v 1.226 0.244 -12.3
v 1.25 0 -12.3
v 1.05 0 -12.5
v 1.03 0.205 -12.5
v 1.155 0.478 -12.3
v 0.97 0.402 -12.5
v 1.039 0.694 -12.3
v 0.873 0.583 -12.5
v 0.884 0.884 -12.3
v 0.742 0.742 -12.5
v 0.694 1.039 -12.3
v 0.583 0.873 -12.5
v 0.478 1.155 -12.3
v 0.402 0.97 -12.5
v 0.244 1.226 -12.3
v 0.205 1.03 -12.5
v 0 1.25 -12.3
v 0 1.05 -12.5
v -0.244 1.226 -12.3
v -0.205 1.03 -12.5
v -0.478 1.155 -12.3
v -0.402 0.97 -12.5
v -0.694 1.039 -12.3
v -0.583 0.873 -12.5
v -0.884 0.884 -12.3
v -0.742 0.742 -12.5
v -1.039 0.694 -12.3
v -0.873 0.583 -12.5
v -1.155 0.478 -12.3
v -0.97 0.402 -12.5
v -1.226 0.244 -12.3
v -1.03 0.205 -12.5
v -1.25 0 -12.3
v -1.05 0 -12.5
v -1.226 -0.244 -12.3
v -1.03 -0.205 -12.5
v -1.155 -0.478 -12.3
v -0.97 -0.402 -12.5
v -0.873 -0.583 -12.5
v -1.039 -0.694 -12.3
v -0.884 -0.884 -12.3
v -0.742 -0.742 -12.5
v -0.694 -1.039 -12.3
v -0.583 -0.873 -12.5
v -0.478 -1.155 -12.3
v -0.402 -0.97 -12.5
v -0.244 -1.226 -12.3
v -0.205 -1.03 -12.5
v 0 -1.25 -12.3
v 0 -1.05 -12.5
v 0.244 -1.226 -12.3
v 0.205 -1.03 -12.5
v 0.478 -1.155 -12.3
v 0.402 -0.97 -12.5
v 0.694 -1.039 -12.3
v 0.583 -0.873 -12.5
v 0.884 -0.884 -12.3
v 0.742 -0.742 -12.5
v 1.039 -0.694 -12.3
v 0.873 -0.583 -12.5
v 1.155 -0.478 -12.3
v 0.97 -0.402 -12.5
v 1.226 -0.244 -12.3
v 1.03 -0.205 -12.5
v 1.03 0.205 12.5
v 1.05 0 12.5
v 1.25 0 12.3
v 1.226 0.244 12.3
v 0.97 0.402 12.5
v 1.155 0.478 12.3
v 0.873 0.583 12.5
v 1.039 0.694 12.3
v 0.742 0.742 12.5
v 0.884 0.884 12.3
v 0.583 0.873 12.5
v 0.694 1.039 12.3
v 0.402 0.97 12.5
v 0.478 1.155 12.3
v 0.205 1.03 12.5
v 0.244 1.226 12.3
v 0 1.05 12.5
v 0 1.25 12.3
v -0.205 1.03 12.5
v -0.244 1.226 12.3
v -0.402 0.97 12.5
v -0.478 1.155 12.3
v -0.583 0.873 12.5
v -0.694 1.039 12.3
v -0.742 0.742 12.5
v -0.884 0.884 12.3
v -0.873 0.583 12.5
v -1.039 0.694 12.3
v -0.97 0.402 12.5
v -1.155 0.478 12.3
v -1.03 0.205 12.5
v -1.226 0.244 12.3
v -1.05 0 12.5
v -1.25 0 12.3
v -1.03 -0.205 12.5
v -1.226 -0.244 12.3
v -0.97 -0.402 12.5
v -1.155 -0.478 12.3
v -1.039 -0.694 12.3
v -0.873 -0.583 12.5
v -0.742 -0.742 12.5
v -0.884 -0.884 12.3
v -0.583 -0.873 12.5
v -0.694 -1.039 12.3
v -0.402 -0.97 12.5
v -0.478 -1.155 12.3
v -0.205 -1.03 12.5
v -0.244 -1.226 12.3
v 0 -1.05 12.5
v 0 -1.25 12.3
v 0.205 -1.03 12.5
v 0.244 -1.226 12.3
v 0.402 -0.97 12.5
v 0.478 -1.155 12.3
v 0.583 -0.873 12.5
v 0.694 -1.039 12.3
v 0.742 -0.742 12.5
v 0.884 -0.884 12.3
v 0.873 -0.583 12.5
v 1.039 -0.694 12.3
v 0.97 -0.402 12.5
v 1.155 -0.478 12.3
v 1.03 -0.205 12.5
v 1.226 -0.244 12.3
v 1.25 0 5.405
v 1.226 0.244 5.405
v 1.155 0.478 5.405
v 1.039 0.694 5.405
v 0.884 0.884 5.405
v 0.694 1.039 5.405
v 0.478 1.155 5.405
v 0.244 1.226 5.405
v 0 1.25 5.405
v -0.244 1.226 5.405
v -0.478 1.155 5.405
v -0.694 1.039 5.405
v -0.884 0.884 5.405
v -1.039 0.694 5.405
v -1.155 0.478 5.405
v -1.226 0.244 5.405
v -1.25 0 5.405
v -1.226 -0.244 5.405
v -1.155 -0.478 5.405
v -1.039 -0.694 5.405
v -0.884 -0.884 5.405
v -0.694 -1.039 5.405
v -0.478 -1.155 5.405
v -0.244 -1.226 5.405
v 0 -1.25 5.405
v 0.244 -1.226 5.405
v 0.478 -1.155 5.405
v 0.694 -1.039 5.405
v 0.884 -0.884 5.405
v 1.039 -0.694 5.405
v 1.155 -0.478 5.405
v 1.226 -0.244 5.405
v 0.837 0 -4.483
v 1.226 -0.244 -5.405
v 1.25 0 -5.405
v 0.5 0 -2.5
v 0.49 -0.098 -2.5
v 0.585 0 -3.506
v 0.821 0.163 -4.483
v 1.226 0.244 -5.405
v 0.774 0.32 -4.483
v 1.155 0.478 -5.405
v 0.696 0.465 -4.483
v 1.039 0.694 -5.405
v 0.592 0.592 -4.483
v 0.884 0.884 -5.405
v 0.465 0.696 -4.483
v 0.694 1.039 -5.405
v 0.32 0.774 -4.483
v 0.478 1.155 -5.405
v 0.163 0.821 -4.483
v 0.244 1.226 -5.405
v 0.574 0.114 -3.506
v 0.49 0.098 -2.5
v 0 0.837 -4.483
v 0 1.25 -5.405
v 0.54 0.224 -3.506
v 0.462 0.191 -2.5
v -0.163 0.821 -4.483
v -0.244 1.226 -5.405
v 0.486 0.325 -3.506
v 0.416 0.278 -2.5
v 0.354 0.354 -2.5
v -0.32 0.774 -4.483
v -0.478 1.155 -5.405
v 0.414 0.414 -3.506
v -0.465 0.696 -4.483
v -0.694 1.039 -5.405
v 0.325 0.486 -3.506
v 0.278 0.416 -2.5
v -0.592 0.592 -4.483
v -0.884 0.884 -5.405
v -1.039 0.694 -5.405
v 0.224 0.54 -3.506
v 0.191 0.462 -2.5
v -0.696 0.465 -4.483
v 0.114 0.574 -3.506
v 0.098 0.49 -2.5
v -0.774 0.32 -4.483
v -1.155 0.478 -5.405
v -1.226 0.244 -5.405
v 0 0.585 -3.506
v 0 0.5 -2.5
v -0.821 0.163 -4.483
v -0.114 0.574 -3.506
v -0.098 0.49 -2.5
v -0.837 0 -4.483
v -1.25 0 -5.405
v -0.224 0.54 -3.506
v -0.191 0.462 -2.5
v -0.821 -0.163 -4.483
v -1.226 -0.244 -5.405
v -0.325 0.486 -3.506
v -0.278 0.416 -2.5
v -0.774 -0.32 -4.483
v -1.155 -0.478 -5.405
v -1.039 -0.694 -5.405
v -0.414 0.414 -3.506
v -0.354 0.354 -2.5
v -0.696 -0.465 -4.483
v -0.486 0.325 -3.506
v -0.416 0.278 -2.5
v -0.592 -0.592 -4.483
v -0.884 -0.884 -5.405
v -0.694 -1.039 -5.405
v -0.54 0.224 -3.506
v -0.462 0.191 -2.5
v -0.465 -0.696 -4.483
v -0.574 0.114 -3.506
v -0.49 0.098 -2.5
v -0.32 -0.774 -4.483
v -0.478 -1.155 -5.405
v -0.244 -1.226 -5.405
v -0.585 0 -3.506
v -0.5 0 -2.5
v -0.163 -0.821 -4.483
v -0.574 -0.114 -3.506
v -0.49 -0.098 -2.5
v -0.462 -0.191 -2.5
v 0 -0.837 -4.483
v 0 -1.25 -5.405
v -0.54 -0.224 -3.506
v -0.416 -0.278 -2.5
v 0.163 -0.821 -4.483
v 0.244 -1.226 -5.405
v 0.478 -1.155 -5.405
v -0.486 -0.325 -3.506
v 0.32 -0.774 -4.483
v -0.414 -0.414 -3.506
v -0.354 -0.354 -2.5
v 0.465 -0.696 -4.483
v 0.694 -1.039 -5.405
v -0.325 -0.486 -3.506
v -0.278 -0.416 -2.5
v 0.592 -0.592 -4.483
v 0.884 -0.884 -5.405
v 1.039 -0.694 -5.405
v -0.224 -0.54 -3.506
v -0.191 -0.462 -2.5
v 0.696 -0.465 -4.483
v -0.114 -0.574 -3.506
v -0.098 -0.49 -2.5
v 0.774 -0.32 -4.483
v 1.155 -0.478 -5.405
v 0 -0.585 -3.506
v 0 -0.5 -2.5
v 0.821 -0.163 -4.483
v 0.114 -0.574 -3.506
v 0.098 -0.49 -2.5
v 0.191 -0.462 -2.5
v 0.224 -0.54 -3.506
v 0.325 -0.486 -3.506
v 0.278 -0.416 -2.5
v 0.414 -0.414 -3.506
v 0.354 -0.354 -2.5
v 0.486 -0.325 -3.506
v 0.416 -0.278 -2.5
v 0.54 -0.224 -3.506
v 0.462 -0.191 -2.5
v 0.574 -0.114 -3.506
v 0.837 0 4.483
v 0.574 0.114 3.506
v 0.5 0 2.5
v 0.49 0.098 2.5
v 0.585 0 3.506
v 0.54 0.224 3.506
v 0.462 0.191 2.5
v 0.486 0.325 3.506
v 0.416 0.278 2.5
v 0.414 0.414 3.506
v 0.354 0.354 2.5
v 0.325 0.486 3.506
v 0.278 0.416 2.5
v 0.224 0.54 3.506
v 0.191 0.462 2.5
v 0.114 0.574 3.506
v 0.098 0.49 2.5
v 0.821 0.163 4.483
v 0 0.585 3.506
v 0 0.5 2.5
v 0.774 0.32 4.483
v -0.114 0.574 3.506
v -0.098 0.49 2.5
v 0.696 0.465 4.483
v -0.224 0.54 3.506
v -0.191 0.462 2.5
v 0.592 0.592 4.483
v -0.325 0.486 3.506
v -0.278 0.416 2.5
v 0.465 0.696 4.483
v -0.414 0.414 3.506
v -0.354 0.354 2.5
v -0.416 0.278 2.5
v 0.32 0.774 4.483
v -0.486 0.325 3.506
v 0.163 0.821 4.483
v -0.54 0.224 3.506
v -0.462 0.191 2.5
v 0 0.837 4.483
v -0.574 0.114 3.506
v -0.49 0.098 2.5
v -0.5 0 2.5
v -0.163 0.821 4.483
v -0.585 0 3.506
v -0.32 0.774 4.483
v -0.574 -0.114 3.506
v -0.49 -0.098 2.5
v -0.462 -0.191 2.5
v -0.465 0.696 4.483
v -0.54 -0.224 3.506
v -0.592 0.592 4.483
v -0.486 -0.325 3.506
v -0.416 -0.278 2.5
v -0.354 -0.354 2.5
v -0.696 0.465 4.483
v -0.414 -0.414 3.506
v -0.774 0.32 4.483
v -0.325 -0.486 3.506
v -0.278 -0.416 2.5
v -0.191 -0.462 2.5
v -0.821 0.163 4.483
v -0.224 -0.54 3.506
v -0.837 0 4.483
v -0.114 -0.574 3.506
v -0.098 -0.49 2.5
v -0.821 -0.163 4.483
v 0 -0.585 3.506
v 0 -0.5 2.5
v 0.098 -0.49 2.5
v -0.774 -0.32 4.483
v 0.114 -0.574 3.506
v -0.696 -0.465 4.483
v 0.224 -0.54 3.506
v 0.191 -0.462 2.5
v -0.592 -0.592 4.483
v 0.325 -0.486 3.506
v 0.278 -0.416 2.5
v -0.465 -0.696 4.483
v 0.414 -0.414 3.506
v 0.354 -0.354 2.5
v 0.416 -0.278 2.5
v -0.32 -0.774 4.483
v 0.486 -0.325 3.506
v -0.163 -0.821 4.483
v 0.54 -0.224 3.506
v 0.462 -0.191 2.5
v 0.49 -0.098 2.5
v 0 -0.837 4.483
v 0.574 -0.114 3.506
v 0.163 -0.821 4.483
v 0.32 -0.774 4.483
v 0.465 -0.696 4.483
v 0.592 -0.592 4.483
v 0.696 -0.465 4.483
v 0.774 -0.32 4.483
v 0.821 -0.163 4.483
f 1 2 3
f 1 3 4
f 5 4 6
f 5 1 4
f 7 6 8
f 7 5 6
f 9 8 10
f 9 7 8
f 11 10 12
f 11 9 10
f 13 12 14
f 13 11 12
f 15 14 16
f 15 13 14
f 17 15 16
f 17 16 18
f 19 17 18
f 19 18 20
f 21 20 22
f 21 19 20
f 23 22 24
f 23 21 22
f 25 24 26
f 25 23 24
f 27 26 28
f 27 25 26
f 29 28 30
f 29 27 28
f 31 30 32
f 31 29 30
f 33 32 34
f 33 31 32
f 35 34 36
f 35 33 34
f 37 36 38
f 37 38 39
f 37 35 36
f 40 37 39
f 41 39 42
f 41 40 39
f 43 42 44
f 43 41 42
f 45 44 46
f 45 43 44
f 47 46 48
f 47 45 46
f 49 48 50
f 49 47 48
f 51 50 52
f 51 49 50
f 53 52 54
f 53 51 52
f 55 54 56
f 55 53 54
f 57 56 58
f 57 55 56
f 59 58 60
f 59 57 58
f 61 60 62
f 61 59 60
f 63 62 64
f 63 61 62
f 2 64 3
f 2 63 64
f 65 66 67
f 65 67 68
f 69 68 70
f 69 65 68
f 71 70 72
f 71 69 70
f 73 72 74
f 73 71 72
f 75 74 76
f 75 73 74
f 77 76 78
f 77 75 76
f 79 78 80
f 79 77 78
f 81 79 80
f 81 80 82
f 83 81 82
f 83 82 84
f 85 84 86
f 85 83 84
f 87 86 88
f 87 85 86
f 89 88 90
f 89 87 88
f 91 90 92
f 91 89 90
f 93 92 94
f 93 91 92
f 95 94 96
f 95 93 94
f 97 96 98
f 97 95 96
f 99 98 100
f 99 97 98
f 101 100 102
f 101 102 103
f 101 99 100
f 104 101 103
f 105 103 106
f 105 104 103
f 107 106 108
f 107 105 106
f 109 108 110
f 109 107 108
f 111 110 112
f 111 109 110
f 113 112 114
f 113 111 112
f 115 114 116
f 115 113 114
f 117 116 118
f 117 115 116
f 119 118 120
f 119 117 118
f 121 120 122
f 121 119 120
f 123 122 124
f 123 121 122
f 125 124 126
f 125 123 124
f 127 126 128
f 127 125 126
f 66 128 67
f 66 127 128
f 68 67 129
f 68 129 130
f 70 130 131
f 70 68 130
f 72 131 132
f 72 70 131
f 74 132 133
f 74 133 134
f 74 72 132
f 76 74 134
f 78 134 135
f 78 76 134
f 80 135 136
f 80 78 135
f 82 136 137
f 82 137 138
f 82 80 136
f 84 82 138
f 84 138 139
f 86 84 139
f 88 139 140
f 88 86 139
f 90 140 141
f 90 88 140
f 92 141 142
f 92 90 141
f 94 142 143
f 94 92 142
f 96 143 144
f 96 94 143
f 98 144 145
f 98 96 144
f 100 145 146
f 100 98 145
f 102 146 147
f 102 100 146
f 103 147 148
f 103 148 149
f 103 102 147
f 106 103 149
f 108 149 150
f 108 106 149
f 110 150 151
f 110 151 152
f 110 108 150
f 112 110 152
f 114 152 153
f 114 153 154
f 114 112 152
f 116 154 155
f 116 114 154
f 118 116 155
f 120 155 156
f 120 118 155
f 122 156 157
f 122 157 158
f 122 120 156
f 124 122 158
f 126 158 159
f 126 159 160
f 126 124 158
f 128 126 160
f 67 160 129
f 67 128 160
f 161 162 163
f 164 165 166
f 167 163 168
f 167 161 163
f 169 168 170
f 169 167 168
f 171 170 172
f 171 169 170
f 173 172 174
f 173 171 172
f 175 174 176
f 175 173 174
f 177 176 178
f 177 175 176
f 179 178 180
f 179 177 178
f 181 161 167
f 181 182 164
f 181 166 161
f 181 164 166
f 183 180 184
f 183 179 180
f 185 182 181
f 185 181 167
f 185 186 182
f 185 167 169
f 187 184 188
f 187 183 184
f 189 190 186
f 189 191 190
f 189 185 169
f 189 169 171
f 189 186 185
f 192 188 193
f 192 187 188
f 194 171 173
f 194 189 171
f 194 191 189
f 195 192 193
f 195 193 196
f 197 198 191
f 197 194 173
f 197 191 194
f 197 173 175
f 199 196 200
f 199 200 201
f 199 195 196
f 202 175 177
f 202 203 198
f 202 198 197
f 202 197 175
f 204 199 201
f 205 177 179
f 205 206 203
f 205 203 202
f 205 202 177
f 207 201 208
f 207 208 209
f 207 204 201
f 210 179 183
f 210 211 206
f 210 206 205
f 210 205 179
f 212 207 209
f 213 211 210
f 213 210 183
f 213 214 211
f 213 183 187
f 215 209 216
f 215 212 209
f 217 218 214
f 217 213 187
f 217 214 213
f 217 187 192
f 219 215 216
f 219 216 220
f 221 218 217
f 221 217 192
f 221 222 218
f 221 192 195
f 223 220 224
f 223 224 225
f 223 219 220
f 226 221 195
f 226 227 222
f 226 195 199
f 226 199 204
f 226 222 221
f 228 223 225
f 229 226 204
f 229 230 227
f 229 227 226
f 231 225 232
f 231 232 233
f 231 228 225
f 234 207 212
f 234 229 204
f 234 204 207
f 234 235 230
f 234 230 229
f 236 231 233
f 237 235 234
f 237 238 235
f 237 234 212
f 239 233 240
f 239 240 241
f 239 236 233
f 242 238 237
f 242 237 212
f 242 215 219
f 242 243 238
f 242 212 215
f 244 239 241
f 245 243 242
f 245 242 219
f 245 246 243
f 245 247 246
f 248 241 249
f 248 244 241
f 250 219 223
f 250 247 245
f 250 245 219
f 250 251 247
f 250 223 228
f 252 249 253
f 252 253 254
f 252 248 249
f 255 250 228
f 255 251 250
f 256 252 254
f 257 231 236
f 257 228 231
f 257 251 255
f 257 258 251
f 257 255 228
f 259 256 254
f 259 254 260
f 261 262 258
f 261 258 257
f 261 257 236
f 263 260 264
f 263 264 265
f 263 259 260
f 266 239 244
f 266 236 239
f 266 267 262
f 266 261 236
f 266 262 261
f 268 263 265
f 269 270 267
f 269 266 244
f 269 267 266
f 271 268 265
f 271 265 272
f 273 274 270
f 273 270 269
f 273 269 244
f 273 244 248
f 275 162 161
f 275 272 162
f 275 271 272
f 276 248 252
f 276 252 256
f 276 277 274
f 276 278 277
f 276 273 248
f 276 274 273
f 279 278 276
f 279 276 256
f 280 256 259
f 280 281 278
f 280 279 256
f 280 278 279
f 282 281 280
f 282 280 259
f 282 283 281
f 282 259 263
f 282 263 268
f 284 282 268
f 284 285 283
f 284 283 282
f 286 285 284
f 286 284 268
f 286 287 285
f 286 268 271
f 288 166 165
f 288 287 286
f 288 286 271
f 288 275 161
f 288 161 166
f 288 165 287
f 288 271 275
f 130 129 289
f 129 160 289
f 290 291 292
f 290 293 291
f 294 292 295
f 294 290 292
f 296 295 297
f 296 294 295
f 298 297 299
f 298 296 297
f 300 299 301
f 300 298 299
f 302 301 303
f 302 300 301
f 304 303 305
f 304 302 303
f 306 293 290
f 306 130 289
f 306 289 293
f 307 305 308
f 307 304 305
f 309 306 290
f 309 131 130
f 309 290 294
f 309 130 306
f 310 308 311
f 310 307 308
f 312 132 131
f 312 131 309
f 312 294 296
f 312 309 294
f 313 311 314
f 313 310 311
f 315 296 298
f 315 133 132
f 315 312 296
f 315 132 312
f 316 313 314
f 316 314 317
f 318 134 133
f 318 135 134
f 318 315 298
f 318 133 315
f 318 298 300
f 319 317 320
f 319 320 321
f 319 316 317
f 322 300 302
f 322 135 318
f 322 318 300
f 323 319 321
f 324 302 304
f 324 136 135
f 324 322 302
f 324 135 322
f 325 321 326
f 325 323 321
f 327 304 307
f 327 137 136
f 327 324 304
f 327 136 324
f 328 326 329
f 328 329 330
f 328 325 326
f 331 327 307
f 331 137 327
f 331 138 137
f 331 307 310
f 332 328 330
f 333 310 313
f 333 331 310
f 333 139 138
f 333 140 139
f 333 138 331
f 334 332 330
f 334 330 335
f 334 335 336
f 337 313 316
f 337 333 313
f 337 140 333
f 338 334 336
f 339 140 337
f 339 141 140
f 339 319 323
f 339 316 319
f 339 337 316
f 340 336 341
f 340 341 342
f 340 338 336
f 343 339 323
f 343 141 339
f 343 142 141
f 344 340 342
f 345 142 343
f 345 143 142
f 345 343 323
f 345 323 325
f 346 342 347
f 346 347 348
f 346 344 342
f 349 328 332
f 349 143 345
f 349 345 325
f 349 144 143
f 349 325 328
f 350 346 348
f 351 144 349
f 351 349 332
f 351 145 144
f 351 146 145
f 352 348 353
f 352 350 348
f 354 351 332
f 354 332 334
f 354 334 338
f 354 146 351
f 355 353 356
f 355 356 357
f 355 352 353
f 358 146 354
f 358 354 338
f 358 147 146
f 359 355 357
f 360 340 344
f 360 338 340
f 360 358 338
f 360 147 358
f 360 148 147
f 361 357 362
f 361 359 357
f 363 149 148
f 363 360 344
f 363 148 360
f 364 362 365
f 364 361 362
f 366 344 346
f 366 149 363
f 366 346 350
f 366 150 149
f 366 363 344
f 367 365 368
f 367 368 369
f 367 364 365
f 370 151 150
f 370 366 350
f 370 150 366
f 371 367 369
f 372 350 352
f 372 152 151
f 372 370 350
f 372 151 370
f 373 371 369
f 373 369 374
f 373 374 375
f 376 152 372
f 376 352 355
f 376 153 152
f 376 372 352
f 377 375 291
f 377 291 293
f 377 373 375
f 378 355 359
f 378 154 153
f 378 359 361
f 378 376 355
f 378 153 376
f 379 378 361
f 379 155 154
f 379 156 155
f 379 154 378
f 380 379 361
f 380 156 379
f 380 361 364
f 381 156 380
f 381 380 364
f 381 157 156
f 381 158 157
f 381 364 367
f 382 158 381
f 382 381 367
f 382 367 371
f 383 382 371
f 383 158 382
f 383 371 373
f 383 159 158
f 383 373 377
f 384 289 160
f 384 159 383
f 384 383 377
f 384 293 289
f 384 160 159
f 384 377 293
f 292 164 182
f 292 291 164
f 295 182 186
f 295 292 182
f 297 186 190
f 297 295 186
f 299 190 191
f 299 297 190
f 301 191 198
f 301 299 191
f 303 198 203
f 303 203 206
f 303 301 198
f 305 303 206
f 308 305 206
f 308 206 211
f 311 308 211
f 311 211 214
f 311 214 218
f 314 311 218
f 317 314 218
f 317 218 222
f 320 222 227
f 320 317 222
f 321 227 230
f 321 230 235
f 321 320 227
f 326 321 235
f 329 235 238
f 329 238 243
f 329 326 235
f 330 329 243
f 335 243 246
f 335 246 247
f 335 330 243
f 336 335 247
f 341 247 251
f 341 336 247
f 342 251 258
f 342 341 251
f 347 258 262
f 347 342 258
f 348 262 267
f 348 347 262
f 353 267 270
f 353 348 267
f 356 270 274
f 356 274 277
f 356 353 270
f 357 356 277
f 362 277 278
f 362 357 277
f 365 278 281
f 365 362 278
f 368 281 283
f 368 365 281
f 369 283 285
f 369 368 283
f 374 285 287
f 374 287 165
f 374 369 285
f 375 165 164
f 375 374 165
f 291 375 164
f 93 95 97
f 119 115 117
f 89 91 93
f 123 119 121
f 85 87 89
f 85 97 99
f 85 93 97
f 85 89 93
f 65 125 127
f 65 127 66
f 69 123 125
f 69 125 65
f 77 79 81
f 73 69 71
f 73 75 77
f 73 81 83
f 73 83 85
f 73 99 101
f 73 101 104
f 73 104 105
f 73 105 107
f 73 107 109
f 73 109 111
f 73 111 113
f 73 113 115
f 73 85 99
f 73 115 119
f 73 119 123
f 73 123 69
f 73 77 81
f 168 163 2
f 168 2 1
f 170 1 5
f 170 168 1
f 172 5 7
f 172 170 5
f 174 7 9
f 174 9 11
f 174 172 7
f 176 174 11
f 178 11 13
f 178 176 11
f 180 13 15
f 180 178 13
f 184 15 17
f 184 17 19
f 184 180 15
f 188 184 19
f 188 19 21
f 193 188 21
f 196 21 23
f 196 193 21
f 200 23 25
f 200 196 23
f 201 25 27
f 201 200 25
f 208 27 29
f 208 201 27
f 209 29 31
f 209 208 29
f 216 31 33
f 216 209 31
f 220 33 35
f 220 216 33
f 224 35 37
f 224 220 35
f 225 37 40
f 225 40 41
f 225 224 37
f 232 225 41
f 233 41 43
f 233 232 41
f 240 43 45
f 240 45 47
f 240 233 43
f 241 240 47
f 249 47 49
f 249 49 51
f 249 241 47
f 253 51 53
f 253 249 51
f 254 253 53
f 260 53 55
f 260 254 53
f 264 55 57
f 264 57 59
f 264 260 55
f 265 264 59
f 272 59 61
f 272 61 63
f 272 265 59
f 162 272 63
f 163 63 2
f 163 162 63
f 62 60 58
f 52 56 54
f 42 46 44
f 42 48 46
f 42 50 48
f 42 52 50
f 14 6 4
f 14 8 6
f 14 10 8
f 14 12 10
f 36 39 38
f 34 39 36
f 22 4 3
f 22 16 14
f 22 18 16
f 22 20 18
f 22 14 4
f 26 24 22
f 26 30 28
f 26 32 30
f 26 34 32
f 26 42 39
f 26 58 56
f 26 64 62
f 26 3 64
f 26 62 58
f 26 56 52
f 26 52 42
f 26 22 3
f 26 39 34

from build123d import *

# Parameters (mm, degrees)
F2_SIZE = 0.2


# Not quite as in the source:
# - a feature names something its author has since deleted; it is built from what else it names


with BuildPart() as f1:
    # F0 (on Front) → F1 (revolve)
    with BuildSketch(Plane.XZ):
        with BuildLine():
            Line((0, 12.5), (0, 0))
            Line((0, 0), (0, -12.5))
            Line((0, -12.5), (1.25, -12.5))
            Line((1.25, -12.5), (1.25, -5.4047375097))
            ThreePointArc((1.25, -5.4047375097), (0.6905249807, -4), (0.5, -2.5))
            Line((0.5, -2.5), (0.5, 0))
            Line((0.5, 0), (0.5, 2.5))
            ThreePointArc((0.5, 2.5), (0.6905249807, 4), (1.25, 5.4047375097))
            Line((1.25, 5.4047375097), (1.25, 12.5))
            Line((1.25, 12.5), (0, 12.5))
        make_face()
    revolve(axis=Axis((0, 0, 6.25), (0, 0, 1)))

    # F2
    f2_edges = [f1.edges().sort_by_distance(p)[0] for p in [
        (-1.25, 0, -12.5),
        (-1.25, 0, 12.5),
    ]]
    chamfer(f2_edges, length=F2_SIZE)


solid = f1.part
